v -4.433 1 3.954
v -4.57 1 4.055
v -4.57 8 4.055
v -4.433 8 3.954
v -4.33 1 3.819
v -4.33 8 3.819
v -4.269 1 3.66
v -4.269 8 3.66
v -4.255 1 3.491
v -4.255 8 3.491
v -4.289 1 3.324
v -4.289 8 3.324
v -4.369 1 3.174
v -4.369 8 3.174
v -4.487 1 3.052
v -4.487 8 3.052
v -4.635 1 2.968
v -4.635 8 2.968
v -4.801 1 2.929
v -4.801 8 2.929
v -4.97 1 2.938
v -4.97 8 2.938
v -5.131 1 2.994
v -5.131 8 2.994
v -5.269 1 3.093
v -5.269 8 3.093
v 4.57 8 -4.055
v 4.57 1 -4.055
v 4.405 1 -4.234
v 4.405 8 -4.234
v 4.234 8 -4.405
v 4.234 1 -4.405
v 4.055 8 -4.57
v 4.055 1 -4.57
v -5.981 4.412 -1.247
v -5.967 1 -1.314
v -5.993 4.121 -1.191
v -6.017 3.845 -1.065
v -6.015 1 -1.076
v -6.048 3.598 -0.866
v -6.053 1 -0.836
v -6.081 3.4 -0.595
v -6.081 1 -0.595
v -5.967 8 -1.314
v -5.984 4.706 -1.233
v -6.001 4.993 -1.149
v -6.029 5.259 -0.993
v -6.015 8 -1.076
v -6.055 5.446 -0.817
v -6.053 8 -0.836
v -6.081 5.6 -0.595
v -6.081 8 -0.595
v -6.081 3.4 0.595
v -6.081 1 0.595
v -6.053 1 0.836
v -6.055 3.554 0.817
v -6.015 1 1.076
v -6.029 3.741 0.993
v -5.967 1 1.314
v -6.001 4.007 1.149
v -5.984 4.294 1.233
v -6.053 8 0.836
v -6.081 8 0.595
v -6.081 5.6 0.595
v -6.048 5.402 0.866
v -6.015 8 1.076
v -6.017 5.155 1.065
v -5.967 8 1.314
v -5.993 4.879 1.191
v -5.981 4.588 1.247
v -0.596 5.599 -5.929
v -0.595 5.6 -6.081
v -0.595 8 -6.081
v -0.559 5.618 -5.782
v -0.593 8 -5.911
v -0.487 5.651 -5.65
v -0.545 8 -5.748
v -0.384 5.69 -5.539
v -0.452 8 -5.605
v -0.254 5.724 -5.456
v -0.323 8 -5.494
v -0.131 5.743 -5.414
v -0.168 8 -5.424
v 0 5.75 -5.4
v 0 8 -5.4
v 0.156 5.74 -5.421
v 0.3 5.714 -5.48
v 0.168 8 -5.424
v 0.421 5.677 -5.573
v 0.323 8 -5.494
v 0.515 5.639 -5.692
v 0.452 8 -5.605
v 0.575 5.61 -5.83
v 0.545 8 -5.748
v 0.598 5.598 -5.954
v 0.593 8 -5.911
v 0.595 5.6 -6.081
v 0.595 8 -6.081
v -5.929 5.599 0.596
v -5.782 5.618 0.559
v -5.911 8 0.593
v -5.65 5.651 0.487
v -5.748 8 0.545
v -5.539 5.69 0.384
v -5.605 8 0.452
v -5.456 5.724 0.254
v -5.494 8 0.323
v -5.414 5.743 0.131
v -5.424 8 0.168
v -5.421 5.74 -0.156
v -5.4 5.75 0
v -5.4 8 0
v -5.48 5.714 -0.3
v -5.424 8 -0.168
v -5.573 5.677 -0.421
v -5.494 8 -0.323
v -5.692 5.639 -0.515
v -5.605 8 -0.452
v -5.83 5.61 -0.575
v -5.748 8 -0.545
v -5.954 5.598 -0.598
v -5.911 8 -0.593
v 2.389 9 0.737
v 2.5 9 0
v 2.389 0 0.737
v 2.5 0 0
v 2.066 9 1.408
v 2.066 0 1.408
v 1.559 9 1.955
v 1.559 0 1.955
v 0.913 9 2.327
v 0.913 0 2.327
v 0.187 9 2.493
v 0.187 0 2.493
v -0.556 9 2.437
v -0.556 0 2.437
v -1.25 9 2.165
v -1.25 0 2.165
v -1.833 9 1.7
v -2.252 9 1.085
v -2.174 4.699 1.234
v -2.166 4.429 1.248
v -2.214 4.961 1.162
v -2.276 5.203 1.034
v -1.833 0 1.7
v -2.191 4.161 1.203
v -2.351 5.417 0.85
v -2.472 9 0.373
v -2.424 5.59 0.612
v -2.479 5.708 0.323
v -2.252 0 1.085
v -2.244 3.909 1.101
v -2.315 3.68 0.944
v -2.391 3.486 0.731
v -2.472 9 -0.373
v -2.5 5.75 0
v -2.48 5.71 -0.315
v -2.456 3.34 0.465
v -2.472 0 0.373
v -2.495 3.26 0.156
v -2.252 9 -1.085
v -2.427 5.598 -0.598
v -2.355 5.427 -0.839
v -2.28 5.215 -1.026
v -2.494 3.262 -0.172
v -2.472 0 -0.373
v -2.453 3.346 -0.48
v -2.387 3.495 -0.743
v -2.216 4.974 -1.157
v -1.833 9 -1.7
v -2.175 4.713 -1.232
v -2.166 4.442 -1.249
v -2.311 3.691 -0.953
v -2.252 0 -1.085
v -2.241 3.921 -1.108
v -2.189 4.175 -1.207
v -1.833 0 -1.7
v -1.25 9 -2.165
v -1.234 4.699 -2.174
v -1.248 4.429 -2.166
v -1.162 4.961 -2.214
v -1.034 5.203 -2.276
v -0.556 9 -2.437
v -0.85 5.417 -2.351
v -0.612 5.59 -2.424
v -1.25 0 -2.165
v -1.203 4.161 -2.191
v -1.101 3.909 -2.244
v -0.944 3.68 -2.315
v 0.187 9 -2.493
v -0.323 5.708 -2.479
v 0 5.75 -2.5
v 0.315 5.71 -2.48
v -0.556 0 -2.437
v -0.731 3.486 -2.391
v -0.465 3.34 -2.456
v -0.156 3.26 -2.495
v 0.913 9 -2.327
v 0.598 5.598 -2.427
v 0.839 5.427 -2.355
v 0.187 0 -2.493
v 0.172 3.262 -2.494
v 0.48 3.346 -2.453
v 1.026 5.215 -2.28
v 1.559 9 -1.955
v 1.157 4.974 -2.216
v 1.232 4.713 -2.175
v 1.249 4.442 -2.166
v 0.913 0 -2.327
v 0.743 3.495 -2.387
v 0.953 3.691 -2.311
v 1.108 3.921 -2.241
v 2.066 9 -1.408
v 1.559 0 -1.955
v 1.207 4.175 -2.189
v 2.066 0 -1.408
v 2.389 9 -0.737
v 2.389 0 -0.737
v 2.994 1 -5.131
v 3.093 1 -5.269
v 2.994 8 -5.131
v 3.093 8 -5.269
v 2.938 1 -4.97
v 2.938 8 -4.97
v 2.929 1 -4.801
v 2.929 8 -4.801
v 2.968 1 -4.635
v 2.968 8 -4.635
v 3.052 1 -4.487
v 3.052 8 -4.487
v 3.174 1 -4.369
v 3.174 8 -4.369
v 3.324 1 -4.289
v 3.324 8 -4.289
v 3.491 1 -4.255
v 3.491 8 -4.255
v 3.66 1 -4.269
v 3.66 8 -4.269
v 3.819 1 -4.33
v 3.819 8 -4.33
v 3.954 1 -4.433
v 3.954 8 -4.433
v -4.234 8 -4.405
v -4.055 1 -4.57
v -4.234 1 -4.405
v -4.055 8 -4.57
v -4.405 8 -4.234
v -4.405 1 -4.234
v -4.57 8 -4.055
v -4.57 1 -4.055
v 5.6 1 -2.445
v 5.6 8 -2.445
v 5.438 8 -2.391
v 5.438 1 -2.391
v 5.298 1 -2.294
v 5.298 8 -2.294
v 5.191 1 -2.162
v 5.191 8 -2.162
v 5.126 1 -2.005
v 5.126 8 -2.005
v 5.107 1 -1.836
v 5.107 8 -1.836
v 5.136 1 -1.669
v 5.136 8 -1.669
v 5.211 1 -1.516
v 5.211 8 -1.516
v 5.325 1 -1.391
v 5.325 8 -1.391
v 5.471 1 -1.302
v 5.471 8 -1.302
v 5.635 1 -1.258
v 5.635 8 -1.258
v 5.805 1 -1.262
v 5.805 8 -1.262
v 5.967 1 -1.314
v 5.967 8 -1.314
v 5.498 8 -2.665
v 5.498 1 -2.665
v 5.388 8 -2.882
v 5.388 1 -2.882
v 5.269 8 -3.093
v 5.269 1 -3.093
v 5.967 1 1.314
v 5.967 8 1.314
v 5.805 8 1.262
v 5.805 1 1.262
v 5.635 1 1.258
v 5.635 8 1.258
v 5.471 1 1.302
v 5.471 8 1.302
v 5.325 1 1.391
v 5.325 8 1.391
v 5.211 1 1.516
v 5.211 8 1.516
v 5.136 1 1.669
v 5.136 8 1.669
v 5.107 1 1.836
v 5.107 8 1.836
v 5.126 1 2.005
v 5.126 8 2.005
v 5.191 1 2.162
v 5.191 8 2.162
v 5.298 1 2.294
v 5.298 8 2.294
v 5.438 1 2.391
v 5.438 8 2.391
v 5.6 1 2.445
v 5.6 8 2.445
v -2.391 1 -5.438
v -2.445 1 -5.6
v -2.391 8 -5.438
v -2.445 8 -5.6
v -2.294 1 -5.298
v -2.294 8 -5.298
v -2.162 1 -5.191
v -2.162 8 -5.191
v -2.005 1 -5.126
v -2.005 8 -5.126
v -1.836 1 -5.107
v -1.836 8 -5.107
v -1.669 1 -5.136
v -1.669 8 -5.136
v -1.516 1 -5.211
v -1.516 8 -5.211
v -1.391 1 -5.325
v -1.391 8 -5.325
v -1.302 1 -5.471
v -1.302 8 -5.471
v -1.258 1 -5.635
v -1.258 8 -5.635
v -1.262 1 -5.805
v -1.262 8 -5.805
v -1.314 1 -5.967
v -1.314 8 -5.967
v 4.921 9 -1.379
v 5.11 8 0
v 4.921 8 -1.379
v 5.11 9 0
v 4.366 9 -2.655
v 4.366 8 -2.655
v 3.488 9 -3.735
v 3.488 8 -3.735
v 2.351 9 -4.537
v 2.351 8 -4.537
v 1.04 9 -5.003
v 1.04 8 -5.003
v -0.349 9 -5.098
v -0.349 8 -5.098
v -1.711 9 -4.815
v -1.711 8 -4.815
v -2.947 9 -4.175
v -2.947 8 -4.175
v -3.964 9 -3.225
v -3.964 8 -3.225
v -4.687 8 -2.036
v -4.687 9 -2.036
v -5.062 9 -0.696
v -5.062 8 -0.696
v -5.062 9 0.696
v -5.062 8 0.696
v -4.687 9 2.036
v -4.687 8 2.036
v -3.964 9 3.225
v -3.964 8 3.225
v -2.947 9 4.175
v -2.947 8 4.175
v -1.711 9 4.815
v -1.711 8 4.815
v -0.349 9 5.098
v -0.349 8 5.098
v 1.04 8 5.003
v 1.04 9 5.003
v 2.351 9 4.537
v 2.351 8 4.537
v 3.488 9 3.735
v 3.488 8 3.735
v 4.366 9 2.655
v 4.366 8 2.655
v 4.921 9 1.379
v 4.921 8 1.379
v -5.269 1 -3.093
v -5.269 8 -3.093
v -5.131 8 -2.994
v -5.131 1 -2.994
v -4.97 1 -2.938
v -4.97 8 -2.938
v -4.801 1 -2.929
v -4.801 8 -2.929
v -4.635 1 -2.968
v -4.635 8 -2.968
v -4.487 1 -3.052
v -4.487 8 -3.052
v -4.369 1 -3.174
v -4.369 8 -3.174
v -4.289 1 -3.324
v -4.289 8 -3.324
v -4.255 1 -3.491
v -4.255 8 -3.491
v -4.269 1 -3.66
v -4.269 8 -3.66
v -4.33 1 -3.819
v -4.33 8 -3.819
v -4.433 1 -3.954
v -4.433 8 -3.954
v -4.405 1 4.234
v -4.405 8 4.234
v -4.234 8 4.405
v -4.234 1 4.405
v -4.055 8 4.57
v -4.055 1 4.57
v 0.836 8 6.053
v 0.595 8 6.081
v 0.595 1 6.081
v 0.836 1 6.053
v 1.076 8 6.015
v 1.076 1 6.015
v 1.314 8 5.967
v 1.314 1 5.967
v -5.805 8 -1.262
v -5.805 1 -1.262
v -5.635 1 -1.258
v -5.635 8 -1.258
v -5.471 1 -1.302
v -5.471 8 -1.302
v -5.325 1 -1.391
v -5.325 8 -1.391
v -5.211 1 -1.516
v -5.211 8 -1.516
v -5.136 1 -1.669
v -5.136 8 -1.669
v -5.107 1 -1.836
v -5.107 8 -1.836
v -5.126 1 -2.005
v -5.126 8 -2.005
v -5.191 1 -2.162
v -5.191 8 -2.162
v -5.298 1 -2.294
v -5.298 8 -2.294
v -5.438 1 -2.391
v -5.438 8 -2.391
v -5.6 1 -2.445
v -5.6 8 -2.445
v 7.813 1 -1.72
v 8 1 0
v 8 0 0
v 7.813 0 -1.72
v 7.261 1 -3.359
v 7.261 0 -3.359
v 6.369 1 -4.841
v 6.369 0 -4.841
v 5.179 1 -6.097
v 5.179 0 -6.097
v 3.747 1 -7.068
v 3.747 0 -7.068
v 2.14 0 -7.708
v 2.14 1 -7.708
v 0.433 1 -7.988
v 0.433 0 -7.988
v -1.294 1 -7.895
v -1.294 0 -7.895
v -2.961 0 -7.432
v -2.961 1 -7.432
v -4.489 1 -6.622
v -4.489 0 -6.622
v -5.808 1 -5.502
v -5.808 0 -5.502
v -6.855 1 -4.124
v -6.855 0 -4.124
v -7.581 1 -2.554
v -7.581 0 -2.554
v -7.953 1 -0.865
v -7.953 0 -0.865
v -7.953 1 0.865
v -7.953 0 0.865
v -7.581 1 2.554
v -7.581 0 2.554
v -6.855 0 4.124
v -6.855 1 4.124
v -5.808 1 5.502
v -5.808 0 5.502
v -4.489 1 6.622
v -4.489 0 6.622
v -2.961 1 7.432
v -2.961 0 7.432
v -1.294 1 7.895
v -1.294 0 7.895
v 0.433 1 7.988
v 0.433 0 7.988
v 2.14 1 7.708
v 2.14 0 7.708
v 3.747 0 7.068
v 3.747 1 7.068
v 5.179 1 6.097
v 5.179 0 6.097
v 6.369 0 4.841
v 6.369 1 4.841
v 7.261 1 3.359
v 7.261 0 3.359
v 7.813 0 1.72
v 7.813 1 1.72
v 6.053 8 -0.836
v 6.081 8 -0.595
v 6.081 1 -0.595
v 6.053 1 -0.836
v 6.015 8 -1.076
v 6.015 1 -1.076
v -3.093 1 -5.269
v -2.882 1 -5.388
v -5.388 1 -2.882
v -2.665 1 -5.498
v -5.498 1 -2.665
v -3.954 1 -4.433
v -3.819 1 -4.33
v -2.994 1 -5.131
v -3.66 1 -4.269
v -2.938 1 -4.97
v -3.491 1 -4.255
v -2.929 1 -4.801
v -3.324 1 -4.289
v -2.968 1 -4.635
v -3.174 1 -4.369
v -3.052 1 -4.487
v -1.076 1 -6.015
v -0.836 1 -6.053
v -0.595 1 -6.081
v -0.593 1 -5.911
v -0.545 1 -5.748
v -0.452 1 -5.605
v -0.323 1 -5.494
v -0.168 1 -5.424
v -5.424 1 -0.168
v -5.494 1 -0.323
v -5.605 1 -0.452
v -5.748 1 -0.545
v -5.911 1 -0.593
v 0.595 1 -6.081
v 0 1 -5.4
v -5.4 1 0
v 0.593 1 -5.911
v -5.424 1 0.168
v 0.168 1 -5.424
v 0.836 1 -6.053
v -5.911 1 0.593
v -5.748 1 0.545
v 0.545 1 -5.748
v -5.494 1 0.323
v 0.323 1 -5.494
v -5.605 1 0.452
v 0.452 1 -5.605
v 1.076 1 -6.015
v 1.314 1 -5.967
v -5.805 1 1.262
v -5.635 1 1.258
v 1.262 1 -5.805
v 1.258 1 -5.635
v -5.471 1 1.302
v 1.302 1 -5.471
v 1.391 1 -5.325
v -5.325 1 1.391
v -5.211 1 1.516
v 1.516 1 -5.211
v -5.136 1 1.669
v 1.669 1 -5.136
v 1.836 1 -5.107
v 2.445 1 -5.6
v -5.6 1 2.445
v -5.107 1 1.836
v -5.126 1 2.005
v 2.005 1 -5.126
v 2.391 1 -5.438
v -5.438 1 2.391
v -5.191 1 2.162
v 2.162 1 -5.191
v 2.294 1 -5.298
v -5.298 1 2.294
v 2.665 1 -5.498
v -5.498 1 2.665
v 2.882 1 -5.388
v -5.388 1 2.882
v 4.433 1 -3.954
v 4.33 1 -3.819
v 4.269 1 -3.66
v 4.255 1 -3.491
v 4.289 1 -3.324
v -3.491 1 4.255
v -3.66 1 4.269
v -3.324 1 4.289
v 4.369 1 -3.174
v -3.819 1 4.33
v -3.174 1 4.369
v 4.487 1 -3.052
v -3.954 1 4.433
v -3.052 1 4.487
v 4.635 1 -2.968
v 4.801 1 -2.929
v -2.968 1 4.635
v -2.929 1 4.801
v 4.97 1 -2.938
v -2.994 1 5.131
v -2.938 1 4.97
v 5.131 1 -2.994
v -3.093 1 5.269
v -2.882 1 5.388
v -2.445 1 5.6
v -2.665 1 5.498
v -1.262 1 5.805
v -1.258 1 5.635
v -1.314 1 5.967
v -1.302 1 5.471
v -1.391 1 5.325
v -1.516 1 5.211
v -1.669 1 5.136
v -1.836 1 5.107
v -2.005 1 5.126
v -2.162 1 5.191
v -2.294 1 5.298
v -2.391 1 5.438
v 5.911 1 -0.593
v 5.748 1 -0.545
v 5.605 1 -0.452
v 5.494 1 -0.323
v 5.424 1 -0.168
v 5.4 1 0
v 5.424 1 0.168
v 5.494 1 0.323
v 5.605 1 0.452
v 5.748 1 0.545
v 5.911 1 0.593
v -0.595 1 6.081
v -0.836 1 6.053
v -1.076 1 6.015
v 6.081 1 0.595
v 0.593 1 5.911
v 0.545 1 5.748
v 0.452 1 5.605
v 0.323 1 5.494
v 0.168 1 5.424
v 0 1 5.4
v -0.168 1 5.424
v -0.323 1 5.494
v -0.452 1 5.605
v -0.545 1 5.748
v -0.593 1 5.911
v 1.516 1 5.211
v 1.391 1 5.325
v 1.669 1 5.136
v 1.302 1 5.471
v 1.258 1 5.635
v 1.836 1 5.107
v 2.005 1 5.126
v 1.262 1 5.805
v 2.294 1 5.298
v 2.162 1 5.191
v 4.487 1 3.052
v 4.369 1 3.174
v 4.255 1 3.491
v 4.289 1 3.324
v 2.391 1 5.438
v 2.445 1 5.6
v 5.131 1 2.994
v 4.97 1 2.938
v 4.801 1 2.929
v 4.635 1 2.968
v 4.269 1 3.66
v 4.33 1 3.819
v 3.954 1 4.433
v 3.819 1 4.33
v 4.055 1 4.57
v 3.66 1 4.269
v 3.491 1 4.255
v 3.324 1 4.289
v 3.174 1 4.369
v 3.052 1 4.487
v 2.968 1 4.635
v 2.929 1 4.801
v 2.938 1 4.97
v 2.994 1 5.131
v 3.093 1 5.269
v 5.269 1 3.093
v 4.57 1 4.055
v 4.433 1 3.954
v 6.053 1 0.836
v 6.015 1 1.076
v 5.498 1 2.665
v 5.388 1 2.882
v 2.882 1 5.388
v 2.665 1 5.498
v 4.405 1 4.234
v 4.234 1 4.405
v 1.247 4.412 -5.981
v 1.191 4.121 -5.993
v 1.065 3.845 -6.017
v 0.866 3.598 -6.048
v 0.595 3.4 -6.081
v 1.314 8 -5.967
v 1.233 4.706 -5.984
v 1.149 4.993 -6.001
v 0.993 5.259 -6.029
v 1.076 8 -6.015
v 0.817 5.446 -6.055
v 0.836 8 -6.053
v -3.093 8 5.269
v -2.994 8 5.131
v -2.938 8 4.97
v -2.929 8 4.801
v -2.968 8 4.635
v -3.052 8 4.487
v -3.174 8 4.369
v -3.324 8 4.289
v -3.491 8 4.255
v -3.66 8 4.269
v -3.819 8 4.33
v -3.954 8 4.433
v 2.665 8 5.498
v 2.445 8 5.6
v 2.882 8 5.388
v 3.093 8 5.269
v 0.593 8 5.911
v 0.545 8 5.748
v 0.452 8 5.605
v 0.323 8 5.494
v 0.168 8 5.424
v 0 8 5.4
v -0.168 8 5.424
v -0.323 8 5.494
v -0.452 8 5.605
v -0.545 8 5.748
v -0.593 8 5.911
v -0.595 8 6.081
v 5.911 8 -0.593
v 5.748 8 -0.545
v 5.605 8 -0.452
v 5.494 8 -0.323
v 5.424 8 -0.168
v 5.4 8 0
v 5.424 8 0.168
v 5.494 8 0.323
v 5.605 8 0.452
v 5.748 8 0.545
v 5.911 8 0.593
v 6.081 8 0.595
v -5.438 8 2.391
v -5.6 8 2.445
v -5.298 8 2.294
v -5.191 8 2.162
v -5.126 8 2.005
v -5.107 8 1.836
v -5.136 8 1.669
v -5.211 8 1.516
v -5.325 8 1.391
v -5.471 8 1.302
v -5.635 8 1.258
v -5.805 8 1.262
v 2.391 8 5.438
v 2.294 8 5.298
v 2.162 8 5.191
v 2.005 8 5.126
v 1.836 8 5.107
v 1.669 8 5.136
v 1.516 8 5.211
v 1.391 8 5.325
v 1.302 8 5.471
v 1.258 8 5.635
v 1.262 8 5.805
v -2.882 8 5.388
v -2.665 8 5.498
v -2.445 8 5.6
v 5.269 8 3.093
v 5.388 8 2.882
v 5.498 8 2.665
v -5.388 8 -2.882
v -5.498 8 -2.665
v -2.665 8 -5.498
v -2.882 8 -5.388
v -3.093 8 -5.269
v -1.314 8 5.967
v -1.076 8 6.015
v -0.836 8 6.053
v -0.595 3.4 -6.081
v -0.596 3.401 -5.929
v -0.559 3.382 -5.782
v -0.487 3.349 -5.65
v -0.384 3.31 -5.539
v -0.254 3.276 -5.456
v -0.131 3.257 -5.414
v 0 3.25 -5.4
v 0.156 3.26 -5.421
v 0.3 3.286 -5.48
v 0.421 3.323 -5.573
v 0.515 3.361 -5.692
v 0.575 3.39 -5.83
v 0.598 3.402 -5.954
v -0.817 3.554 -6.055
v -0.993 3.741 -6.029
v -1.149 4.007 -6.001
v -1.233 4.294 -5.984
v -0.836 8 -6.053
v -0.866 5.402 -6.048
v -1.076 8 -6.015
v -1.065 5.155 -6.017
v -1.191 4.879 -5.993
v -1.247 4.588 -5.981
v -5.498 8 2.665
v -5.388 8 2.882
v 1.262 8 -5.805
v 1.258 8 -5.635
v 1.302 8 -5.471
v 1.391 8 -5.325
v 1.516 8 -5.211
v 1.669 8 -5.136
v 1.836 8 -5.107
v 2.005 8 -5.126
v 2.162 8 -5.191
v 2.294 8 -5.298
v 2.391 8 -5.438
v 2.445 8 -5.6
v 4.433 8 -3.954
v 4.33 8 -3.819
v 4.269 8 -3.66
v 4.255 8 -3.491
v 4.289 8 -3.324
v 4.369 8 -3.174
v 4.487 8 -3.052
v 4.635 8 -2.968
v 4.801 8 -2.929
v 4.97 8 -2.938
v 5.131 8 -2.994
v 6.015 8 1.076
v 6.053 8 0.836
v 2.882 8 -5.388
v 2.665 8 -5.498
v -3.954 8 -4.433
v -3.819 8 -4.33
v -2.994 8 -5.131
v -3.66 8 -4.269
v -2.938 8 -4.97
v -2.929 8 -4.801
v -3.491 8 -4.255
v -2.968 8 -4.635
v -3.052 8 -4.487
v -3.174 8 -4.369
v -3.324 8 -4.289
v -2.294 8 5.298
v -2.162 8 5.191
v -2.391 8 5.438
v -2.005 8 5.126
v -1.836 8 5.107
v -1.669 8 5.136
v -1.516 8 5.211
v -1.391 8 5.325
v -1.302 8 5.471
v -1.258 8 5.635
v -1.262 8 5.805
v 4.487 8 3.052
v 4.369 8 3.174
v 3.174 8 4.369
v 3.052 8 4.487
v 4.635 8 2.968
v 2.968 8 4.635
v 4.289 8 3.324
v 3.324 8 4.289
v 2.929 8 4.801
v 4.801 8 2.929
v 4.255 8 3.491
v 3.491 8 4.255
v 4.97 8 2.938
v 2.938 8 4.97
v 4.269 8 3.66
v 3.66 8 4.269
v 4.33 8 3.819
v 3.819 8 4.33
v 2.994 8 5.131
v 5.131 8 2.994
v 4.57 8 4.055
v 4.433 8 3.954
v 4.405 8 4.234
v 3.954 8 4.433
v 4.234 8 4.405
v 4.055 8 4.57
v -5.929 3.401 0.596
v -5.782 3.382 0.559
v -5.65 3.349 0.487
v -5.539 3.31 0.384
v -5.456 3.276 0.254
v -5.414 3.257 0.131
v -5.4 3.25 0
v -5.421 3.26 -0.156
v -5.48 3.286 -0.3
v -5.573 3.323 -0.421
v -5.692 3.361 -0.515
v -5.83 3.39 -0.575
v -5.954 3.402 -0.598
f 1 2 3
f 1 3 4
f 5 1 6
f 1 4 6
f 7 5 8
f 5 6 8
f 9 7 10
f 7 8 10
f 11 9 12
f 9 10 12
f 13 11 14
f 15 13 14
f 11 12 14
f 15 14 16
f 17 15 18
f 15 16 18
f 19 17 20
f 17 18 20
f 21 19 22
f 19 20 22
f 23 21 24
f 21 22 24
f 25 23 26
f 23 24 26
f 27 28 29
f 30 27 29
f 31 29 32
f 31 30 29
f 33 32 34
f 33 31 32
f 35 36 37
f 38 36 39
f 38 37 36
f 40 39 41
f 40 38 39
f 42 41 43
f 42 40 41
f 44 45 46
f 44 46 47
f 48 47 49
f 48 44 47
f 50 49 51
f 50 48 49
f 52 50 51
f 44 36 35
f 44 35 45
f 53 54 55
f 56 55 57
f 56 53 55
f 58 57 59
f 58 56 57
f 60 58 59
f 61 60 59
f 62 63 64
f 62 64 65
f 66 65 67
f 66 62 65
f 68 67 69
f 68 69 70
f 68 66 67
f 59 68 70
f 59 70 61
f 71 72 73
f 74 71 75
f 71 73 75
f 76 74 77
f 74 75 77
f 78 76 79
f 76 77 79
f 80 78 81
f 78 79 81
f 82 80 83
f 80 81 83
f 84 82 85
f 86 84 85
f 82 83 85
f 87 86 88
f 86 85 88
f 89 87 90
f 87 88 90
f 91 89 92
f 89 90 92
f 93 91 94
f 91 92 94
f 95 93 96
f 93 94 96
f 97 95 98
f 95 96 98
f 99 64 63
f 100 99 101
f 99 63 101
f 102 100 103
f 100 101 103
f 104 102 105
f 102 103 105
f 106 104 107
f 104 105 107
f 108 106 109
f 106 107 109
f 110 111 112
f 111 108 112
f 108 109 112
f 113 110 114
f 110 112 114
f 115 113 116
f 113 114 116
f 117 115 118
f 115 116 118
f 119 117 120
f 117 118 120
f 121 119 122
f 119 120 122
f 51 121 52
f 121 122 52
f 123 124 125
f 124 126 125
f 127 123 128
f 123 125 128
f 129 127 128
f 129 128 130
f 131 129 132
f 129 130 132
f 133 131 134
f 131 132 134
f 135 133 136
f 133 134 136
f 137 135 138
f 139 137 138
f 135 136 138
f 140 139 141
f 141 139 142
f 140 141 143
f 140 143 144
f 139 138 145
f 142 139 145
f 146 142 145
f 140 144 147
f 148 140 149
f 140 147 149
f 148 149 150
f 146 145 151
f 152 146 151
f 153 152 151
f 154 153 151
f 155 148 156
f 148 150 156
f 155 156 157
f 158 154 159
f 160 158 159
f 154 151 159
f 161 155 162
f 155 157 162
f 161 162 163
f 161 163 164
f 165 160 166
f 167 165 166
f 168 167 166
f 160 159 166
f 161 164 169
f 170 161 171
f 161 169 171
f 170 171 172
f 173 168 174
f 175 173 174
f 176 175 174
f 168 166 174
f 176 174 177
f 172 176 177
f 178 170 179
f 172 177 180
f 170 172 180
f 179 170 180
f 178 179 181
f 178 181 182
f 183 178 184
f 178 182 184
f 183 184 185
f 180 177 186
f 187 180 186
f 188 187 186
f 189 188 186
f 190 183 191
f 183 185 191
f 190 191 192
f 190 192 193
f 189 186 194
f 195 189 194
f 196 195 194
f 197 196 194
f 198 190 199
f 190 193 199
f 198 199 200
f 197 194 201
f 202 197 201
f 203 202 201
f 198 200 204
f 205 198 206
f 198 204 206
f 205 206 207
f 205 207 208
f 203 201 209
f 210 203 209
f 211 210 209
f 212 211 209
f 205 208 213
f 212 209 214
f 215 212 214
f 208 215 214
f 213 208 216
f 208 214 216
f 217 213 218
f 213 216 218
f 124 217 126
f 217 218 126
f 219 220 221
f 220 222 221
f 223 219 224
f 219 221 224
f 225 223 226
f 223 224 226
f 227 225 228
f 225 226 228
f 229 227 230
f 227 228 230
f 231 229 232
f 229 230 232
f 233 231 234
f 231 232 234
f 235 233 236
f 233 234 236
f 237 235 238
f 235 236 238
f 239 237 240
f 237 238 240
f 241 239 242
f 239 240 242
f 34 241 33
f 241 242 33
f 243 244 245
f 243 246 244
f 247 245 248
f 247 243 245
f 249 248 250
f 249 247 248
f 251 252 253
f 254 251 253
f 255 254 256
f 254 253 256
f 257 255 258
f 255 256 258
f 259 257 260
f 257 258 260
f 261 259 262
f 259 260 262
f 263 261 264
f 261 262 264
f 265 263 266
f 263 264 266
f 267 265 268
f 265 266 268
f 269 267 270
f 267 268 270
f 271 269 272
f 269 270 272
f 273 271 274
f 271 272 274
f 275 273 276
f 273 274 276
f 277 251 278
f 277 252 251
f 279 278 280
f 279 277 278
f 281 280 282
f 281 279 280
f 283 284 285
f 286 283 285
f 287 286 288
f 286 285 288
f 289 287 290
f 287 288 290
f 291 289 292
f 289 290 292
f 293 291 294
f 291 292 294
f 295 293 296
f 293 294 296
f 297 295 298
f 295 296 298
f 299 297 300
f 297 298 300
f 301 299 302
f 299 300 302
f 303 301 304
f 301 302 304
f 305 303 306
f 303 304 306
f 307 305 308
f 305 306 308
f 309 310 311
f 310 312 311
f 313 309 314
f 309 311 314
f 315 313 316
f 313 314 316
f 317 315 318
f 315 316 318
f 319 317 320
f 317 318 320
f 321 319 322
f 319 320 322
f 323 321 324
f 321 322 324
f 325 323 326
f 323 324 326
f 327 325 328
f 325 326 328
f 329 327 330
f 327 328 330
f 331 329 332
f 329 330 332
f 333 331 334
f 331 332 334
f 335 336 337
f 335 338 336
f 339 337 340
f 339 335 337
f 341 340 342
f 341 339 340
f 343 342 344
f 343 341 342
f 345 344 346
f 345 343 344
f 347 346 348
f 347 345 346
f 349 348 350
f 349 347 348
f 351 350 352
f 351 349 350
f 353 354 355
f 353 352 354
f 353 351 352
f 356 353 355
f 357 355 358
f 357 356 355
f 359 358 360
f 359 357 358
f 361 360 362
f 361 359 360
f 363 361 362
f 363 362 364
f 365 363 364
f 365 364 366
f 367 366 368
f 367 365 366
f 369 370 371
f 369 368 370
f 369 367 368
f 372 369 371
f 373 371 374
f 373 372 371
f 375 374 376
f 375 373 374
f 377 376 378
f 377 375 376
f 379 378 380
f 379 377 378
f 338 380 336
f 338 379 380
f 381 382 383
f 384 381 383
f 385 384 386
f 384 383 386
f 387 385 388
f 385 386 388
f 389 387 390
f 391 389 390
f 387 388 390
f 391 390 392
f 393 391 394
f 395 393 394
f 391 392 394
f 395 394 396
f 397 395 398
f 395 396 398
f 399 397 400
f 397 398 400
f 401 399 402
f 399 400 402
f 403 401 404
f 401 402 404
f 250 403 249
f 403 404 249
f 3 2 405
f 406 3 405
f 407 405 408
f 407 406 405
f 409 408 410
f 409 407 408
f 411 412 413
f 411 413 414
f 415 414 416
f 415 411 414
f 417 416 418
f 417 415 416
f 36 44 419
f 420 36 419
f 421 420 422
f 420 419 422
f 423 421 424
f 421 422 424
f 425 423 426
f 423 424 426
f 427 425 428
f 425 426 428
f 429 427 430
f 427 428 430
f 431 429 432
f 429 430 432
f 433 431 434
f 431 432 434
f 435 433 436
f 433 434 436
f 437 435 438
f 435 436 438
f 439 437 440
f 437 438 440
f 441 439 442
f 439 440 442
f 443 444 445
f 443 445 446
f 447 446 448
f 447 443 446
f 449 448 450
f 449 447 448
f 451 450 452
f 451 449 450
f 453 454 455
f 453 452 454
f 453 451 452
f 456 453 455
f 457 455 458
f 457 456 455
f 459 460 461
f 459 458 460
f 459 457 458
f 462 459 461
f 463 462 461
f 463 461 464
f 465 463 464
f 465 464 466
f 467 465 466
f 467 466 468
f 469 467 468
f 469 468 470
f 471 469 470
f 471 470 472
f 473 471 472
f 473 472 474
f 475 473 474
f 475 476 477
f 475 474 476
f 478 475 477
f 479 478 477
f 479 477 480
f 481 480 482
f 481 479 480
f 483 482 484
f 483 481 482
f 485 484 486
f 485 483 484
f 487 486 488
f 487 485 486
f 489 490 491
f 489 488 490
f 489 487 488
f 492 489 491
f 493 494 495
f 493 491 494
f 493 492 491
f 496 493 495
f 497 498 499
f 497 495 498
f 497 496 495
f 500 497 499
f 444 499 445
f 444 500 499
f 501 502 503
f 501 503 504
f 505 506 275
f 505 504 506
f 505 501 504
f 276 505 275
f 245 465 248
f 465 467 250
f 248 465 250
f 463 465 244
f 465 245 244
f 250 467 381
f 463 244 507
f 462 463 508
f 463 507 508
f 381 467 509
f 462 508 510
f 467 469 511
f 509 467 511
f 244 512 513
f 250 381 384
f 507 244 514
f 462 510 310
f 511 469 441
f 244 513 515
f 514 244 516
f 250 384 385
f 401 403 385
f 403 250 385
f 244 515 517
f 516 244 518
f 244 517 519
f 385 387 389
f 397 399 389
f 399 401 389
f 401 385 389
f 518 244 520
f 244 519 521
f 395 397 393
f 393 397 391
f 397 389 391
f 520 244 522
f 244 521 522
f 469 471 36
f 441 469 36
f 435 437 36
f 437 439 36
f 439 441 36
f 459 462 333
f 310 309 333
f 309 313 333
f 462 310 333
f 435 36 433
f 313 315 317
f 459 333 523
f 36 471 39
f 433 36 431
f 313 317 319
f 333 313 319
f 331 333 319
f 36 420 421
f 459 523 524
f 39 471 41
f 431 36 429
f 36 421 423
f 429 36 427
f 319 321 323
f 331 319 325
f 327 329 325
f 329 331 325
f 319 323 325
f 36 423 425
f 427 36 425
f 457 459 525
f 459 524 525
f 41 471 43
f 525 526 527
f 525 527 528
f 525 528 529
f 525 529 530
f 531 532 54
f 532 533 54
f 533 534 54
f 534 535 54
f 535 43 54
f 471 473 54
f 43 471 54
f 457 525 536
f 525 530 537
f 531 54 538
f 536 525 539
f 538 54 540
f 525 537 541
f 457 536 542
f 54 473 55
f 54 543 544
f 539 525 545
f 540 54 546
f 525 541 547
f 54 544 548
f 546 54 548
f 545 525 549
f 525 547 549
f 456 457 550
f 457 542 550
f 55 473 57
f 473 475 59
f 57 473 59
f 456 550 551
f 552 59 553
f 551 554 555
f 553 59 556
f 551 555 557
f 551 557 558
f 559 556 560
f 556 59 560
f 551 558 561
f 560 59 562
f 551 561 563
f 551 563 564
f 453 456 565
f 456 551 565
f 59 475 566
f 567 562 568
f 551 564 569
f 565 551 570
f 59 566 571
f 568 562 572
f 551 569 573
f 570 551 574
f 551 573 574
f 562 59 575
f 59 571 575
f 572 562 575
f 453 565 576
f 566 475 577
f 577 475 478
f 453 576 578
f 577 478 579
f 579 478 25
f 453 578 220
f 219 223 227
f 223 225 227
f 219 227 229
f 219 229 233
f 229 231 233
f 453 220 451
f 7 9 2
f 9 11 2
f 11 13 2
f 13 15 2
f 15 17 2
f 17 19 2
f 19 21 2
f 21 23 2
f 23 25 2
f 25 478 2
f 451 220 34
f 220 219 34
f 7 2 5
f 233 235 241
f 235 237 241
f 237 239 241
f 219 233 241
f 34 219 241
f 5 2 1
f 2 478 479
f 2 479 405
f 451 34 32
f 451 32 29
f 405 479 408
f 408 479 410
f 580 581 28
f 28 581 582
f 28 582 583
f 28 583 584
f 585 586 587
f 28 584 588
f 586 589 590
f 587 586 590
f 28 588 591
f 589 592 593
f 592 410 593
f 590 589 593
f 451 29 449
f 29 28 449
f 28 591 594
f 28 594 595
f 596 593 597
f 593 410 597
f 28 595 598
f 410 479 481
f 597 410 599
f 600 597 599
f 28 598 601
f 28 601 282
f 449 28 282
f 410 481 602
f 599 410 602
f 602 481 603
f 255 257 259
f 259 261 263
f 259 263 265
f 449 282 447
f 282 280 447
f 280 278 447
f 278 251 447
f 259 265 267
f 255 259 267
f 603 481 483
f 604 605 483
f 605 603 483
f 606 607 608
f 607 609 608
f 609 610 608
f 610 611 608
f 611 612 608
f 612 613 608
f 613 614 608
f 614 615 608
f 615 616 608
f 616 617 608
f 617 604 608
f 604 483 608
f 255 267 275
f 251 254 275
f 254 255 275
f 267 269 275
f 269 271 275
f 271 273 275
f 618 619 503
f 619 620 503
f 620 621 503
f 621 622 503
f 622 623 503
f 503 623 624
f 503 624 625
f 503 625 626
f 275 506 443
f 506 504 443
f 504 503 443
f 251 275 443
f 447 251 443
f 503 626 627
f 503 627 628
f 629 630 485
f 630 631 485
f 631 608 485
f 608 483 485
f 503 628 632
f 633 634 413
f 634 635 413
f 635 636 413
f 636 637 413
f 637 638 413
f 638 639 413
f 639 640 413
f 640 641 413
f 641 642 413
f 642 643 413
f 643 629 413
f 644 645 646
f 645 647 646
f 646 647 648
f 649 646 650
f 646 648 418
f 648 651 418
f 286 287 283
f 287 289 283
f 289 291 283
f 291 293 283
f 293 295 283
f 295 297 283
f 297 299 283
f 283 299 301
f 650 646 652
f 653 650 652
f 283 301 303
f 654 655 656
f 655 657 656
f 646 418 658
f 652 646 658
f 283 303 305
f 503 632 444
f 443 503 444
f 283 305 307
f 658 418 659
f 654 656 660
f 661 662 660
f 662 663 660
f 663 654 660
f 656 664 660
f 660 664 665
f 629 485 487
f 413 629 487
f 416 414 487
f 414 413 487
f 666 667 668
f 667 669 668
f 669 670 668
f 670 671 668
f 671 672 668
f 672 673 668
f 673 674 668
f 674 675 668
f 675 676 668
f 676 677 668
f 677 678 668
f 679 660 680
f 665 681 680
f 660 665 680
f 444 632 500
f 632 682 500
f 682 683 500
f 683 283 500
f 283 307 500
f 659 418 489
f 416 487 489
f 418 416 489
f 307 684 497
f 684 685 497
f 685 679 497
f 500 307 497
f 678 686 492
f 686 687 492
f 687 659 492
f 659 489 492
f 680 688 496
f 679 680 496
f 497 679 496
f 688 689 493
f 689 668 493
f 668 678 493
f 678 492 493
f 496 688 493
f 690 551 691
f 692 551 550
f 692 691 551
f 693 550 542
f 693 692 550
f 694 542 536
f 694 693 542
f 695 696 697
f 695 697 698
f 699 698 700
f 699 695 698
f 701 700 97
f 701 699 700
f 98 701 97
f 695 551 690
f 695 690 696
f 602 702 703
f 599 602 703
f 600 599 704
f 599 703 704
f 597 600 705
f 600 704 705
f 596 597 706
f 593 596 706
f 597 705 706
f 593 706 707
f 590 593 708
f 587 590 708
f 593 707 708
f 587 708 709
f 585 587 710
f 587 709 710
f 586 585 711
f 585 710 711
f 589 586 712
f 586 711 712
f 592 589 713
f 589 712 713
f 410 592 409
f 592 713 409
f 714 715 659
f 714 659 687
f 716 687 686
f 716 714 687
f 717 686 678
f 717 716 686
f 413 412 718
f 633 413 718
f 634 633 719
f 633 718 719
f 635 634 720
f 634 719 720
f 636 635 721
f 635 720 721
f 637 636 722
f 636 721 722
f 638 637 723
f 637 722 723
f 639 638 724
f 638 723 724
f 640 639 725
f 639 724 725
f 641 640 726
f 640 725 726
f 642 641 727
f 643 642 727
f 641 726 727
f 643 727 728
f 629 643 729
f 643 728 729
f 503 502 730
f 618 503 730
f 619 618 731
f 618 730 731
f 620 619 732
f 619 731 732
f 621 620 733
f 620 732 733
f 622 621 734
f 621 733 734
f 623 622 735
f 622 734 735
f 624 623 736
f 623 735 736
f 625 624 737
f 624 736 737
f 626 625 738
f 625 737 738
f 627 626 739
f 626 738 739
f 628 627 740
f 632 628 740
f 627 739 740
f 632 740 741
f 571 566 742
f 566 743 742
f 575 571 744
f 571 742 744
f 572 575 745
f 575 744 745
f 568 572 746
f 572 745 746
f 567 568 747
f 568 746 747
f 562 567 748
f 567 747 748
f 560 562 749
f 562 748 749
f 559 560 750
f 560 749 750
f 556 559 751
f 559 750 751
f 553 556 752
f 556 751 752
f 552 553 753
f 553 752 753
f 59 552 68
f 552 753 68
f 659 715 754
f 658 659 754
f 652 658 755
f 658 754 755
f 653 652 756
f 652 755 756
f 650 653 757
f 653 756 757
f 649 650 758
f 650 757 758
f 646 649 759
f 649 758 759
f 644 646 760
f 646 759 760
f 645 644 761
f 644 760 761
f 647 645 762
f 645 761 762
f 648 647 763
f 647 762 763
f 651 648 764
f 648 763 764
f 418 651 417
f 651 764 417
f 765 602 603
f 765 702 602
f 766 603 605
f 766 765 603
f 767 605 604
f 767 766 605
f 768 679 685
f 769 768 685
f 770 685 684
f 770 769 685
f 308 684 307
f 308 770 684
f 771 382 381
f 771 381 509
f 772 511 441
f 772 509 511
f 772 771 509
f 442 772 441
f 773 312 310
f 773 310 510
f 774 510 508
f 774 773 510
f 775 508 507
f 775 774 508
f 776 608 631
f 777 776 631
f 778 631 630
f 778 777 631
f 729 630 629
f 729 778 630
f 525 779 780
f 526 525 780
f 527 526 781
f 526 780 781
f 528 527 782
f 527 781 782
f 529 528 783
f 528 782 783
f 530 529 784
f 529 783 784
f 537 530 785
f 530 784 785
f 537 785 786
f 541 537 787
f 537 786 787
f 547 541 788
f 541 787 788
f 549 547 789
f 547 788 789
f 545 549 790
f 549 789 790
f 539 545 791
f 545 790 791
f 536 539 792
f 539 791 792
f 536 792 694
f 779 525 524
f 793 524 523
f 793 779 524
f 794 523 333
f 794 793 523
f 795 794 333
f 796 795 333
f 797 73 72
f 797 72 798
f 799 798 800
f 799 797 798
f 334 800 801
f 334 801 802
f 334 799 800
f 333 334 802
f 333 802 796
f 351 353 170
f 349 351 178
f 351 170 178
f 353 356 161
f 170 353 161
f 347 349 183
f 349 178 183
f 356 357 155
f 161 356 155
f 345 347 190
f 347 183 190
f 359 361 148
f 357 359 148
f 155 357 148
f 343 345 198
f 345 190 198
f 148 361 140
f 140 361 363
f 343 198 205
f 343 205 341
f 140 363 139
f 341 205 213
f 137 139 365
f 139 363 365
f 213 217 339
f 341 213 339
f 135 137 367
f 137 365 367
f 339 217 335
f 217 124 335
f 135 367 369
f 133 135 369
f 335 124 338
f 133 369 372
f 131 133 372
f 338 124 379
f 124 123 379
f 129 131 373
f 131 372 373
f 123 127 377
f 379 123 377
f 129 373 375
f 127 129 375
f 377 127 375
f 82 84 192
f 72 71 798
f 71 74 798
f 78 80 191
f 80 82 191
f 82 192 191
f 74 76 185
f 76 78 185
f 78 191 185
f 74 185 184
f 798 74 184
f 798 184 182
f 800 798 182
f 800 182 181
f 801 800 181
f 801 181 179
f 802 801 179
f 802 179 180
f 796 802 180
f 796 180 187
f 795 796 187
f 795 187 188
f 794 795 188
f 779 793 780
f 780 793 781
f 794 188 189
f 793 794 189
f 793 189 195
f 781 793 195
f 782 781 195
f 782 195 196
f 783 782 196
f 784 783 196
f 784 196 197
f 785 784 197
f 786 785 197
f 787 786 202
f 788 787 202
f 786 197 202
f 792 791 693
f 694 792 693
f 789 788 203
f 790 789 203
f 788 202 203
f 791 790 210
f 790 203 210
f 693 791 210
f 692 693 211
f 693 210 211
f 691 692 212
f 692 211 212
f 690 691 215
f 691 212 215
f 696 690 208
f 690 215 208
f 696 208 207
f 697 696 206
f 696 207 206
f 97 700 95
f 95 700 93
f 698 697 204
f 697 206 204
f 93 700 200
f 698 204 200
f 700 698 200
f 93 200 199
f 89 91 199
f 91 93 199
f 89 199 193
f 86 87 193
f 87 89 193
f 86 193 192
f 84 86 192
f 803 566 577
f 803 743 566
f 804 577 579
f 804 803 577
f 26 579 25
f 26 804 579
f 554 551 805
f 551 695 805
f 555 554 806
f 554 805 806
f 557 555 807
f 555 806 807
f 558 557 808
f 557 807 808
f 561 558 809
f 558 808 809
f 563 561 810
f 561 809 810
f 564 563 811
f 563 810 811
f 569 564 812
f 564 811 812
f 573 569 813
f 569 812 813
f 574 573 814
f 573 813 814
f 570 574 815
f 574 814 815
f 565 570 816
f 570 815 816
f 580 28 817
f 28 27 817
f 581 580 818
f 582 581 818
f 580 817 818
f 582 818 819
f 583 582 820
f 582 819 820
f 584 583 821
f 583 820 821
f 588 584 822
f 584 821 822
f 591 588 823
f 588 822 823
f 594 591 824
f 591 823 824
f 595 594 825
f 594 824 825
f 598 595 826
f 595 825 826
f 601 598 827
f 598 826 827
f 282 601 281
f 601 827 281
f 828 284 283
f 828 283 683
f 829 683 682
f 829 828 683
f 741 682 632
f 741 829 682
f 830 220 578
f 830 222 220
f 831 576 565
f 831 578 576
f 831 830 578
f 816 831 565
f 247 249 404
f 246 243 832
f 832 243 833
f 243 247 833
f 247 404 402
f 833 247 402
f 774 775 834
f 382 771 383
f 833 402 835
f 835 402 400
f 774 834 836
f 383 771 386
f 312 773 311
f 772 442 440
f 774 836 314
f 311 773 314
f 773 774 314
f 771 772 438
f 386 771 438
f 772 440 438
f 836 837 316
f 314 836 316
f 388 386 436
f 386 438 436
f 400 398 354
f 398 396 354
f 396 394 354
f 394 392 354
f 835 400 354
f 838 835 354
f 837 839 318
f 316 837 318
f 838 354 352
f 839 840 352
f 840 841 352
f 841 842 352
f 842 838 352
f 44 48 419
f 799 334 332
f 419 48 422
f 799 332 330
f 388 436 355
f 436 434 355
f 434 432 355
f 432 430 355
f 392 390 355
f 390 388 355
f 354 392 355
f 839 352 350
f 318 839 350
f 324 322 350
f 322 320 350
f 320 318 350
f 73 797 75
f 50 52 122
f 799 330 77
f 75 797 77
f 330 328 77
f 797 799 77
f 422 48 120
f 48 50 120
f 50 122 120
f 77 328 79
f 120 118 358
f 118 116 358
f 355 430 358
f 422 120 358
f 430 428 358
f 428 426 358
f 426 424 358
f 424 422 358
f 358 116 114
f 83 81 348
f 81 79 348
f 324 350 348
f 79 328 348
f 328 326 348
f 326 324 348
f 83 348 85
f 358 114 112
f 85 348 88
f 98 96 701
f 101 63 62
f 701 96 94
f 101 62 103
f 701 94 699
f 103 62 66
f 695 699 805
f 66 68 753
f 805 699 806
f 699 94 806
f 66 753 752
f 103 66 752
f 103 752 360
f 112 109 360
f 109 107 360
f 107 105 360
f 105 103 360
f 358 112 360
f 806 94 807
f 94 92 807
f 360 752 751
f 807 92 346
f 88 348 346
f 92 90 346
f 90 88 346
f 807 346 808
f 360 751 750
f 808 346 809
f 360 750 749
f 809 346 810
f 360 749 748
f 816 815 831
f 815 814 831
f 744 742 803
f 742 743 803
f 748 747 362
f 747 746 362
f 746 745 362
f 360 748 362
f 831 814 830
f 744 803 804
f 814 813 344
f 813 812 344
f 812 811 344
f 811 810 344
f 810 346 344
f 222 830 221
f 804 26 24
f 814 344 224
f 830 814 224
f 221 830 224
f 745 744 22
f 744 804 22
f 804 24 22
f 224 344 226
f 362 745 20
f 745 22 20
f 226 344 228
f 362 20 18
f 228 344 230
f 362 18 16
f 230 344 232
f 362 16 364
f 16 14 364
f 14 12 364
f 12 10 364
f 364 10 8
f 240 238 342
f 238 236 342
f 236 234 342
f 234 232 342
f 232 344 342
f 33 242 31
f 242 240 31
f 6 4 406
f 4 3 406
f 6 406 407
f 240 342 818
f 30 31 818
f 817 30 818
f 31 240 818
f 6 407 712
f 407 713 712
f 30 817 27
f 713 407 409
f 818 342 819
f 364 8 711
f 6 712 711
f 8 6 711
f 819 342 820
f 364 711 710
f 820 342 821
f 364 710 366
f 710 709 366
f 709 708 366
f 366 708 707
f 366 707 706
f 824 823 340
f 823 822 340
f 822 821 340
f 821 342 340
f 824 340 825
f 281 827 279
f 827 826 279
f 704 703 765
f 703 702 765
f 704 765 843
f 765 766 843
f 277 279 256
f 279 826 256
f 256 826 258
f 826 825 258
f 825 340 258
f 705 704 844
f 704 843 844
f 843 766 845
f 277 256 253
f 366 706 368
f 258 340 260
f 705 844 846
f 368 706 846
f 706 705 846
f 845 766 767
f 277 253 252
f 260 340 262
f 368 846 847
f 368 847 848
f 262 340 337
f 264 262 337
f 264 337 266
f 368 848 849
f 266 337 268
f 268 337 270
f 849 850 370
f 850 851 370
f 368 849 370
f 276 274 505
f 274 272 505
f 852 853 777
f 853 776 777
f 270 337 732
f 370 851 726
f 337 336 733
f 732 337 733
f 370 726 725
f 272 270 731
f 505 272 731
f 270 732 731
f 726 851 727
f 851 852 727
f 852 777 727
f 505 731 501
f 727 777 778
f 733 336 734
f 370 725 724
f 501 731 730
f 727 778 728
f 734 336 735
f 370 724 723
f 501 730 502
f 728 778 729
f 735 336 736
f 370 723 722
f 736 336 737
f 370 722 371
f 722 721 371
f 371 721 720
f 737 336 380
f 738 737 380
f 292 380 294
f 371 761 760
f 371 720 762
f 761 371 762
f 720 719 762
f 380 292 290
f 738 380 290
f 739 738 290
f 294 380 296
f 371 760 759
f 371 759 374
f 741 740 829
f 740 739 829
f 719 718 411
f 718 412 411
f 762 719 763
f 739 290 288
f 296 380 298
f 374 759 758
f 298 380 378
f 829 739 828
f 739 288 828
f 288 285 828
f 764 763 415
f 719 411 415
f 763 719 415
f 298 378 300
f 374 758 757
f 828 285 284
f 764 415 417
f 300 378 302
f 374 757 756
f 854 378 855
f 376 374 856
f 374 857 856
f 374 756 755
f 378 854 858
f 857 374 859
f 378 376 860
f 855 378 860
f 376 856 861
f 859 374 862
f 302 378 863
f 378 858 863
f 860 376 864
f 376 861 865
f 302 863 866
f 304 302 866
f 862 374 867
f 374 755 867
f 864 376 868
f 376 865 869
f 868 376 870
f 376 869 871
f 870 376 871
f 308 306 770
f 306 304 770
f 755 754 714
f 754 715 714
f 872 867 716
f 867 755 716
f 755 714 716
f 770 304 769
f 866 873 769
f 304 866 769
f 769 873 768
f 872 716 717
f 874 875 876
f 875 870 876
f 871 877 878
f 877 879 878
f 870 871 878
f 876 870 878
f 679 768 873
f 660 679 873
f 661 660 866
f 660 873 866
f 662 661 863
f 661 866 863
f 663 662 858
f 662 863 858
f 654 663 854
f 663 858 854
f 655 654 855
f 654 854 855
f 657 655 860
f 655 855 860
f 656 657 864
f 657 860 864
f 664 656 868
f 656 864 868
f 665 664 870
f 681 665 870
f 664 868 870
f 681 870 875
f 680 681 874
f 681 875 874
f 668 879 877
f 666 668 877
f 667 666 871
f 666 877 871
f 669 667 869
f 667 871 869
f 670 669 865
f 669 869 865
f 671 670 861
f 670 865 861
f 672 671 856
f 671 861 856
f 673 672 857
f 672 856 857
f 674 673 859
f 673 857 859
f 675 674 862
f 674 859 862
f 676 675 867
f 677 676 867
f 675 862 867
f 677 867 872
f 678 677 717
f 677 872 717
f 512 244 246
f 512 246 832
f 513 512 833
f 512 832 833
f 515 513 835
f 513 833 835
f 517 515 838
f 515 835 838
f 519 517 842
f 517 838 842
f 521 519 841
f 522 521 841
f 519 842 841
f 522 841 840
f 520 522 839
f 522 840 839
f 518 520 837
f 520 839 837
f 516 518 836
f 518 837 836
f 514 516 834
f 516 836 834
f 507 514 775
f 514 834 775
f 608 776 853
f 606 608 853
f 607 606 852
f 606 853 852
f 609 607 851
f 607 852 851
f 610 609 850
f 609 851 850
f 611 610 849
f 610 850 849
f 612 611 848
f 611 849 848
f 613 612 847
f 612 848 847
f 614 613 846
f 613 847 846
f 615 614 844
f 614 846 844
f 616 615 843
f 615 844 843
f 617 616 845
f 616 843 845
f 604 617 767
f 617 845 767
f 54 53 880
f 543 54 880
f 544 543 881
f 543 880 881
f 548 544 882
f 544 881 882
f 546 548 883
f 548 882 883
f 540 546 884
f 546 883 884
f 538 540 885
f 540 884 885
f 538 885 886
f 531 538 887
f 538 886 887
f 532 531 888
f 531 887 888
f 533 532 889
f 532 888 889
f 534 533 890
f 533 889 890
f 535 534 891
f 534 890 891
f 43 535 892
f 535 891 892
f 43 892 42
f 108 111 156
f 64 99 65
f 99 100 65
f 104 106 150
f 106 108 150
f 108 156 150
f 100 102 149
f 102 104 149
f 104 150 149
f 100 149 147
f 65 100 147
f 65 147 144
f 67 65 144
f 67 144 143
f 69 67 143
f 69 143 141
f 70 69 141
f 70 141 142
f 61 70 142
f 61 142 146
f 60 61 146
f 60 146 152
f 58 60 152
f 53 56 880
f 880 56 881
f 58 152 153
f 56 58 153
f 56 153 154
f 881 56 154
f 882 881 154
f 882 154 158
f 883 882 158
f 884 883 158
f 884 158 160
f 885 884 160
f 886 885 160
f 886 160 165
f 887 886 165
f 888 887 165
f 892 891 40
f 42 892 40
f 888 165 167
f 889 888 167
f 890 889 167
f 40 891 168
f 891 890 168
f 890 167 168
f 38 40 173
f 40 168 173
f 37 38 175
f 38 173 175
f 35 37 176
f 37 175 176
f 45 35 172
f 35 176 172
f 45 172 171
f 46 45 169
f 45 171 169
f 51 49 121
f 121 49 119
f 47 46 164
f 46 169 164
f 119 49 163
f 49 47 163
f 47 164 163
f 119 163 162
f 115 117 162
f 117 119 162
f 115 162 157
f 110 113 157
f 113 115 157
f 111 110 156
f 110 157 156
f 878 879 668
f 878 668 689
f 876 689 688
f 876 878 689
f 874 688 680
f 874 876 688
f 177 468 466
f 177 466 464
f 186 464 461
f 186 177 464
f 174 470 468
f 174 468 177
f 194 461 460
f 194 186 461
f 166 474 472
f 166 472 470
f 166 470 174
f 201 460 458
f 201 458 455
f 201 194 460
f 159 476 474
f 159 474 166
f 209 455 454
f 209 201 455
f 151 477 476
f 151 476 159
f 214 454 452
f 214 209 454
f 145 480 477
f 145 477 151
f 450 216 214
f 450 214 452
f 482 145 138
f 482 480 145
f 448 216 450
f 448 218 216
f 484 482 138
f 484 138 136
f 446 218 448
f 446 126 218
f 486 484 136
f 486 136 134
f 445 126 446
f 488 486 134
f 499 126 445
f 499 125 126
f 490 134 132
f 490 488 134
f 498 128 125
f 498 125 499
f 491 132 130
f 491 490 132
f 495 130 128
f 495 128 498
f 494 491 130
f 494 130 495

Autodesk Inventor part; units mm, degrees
ref_plane "YZ Plane" through (0, 0, 0) normal (1, 0, 0) x (0, 1, 0)
ref_plane "XZ Plane" through (0, 0, 0) normal (0, 1, 0) x (-1, 0, 0)
ref_plane "XY Plane" through (0, 0, 0) normal (0, 0, 1) x (1, 0, 0)
sketch "Sketch1" plane through (0, 0, 0) normal (0, 0, 1) x (1, 0, 0)
  line L0 (0, 0) -> (2.5, 0) construction
  line L1 (8, 0) -> (8, 1)
  line L2 (8, 1) -> (6.11, 1)
  line L3 (6.11, 1) -> (6.11, 8)
  line L4 (6.11, 8) -> (5.11, 8)
  line L5 (5.11, 8) -> (5.11, 9)
  line L6 (5.11, 9) -> (2.5, 9)
  line L7 (0, 9) -> (0, 0) construction
  line L8 (2.5, 9) -> (2.5, 0)
  line L9 (2.5, 9) -> (0, 9) construction
  line L10 (2.5, 0) -> (8, 0)
  dimension "d0" = 7
  dimension "d1" = 1
  dimension "d2" = 8
  dimension "d3" = 6.11
  dimension "d5" = 1
  dimension "d6" = 1
  dimension "d15" = 2.5
revolve "Revolution1" add sketch "Sketch1" angle 360 about axis through (0, 9, 0) along (0, -1, 0)
sketch "Sketch2" plane through (0, 8, 0) normal (0, 1, 0) x (1, 0, 0)
  circle A0 centre (0, 0) radius 5.11 construction
  line L0 (0, 0) -> (-6, 0) construction
  circle A1 centre (-6, 0) radius 0.6
  point P0 (0, 0)
  dimension "d8" = 1.2
  dimension "d9" = 6
extrude "Extrusion1" cut sketch "Sketch2" against normal up to surface (7 mm away)
pattern_circular "Circular Pattern1" count 20 over 360 about axis through (0, 8.5, 0) along (0, -1, 0) of "Extrusion1"
sketch "Sketch3" plane through (0, 0, 0) normal (1, 0, 0) x (0, 1, 0)
  line L0 (1, 8) -> (1, -8) construction
  line L1 (8, 0) -> (1, 0) construction
  circle A0 centre (4.5, 0) radius 1.25
  line L2 (8, 5.11) -> (8, -5.11) construction
  dimension "d16" = 2.5
extrude "Extrusion2" cut sketch "Sketch3" against normal blind 10
pattern_circular "Circular Pattern2" count 2 over 90 about axis through (0, 4.5, 0) along (0, -1, 0) of "Extrusion2"
properties part number "GT2Pulley_20T_5mm_noTop"
